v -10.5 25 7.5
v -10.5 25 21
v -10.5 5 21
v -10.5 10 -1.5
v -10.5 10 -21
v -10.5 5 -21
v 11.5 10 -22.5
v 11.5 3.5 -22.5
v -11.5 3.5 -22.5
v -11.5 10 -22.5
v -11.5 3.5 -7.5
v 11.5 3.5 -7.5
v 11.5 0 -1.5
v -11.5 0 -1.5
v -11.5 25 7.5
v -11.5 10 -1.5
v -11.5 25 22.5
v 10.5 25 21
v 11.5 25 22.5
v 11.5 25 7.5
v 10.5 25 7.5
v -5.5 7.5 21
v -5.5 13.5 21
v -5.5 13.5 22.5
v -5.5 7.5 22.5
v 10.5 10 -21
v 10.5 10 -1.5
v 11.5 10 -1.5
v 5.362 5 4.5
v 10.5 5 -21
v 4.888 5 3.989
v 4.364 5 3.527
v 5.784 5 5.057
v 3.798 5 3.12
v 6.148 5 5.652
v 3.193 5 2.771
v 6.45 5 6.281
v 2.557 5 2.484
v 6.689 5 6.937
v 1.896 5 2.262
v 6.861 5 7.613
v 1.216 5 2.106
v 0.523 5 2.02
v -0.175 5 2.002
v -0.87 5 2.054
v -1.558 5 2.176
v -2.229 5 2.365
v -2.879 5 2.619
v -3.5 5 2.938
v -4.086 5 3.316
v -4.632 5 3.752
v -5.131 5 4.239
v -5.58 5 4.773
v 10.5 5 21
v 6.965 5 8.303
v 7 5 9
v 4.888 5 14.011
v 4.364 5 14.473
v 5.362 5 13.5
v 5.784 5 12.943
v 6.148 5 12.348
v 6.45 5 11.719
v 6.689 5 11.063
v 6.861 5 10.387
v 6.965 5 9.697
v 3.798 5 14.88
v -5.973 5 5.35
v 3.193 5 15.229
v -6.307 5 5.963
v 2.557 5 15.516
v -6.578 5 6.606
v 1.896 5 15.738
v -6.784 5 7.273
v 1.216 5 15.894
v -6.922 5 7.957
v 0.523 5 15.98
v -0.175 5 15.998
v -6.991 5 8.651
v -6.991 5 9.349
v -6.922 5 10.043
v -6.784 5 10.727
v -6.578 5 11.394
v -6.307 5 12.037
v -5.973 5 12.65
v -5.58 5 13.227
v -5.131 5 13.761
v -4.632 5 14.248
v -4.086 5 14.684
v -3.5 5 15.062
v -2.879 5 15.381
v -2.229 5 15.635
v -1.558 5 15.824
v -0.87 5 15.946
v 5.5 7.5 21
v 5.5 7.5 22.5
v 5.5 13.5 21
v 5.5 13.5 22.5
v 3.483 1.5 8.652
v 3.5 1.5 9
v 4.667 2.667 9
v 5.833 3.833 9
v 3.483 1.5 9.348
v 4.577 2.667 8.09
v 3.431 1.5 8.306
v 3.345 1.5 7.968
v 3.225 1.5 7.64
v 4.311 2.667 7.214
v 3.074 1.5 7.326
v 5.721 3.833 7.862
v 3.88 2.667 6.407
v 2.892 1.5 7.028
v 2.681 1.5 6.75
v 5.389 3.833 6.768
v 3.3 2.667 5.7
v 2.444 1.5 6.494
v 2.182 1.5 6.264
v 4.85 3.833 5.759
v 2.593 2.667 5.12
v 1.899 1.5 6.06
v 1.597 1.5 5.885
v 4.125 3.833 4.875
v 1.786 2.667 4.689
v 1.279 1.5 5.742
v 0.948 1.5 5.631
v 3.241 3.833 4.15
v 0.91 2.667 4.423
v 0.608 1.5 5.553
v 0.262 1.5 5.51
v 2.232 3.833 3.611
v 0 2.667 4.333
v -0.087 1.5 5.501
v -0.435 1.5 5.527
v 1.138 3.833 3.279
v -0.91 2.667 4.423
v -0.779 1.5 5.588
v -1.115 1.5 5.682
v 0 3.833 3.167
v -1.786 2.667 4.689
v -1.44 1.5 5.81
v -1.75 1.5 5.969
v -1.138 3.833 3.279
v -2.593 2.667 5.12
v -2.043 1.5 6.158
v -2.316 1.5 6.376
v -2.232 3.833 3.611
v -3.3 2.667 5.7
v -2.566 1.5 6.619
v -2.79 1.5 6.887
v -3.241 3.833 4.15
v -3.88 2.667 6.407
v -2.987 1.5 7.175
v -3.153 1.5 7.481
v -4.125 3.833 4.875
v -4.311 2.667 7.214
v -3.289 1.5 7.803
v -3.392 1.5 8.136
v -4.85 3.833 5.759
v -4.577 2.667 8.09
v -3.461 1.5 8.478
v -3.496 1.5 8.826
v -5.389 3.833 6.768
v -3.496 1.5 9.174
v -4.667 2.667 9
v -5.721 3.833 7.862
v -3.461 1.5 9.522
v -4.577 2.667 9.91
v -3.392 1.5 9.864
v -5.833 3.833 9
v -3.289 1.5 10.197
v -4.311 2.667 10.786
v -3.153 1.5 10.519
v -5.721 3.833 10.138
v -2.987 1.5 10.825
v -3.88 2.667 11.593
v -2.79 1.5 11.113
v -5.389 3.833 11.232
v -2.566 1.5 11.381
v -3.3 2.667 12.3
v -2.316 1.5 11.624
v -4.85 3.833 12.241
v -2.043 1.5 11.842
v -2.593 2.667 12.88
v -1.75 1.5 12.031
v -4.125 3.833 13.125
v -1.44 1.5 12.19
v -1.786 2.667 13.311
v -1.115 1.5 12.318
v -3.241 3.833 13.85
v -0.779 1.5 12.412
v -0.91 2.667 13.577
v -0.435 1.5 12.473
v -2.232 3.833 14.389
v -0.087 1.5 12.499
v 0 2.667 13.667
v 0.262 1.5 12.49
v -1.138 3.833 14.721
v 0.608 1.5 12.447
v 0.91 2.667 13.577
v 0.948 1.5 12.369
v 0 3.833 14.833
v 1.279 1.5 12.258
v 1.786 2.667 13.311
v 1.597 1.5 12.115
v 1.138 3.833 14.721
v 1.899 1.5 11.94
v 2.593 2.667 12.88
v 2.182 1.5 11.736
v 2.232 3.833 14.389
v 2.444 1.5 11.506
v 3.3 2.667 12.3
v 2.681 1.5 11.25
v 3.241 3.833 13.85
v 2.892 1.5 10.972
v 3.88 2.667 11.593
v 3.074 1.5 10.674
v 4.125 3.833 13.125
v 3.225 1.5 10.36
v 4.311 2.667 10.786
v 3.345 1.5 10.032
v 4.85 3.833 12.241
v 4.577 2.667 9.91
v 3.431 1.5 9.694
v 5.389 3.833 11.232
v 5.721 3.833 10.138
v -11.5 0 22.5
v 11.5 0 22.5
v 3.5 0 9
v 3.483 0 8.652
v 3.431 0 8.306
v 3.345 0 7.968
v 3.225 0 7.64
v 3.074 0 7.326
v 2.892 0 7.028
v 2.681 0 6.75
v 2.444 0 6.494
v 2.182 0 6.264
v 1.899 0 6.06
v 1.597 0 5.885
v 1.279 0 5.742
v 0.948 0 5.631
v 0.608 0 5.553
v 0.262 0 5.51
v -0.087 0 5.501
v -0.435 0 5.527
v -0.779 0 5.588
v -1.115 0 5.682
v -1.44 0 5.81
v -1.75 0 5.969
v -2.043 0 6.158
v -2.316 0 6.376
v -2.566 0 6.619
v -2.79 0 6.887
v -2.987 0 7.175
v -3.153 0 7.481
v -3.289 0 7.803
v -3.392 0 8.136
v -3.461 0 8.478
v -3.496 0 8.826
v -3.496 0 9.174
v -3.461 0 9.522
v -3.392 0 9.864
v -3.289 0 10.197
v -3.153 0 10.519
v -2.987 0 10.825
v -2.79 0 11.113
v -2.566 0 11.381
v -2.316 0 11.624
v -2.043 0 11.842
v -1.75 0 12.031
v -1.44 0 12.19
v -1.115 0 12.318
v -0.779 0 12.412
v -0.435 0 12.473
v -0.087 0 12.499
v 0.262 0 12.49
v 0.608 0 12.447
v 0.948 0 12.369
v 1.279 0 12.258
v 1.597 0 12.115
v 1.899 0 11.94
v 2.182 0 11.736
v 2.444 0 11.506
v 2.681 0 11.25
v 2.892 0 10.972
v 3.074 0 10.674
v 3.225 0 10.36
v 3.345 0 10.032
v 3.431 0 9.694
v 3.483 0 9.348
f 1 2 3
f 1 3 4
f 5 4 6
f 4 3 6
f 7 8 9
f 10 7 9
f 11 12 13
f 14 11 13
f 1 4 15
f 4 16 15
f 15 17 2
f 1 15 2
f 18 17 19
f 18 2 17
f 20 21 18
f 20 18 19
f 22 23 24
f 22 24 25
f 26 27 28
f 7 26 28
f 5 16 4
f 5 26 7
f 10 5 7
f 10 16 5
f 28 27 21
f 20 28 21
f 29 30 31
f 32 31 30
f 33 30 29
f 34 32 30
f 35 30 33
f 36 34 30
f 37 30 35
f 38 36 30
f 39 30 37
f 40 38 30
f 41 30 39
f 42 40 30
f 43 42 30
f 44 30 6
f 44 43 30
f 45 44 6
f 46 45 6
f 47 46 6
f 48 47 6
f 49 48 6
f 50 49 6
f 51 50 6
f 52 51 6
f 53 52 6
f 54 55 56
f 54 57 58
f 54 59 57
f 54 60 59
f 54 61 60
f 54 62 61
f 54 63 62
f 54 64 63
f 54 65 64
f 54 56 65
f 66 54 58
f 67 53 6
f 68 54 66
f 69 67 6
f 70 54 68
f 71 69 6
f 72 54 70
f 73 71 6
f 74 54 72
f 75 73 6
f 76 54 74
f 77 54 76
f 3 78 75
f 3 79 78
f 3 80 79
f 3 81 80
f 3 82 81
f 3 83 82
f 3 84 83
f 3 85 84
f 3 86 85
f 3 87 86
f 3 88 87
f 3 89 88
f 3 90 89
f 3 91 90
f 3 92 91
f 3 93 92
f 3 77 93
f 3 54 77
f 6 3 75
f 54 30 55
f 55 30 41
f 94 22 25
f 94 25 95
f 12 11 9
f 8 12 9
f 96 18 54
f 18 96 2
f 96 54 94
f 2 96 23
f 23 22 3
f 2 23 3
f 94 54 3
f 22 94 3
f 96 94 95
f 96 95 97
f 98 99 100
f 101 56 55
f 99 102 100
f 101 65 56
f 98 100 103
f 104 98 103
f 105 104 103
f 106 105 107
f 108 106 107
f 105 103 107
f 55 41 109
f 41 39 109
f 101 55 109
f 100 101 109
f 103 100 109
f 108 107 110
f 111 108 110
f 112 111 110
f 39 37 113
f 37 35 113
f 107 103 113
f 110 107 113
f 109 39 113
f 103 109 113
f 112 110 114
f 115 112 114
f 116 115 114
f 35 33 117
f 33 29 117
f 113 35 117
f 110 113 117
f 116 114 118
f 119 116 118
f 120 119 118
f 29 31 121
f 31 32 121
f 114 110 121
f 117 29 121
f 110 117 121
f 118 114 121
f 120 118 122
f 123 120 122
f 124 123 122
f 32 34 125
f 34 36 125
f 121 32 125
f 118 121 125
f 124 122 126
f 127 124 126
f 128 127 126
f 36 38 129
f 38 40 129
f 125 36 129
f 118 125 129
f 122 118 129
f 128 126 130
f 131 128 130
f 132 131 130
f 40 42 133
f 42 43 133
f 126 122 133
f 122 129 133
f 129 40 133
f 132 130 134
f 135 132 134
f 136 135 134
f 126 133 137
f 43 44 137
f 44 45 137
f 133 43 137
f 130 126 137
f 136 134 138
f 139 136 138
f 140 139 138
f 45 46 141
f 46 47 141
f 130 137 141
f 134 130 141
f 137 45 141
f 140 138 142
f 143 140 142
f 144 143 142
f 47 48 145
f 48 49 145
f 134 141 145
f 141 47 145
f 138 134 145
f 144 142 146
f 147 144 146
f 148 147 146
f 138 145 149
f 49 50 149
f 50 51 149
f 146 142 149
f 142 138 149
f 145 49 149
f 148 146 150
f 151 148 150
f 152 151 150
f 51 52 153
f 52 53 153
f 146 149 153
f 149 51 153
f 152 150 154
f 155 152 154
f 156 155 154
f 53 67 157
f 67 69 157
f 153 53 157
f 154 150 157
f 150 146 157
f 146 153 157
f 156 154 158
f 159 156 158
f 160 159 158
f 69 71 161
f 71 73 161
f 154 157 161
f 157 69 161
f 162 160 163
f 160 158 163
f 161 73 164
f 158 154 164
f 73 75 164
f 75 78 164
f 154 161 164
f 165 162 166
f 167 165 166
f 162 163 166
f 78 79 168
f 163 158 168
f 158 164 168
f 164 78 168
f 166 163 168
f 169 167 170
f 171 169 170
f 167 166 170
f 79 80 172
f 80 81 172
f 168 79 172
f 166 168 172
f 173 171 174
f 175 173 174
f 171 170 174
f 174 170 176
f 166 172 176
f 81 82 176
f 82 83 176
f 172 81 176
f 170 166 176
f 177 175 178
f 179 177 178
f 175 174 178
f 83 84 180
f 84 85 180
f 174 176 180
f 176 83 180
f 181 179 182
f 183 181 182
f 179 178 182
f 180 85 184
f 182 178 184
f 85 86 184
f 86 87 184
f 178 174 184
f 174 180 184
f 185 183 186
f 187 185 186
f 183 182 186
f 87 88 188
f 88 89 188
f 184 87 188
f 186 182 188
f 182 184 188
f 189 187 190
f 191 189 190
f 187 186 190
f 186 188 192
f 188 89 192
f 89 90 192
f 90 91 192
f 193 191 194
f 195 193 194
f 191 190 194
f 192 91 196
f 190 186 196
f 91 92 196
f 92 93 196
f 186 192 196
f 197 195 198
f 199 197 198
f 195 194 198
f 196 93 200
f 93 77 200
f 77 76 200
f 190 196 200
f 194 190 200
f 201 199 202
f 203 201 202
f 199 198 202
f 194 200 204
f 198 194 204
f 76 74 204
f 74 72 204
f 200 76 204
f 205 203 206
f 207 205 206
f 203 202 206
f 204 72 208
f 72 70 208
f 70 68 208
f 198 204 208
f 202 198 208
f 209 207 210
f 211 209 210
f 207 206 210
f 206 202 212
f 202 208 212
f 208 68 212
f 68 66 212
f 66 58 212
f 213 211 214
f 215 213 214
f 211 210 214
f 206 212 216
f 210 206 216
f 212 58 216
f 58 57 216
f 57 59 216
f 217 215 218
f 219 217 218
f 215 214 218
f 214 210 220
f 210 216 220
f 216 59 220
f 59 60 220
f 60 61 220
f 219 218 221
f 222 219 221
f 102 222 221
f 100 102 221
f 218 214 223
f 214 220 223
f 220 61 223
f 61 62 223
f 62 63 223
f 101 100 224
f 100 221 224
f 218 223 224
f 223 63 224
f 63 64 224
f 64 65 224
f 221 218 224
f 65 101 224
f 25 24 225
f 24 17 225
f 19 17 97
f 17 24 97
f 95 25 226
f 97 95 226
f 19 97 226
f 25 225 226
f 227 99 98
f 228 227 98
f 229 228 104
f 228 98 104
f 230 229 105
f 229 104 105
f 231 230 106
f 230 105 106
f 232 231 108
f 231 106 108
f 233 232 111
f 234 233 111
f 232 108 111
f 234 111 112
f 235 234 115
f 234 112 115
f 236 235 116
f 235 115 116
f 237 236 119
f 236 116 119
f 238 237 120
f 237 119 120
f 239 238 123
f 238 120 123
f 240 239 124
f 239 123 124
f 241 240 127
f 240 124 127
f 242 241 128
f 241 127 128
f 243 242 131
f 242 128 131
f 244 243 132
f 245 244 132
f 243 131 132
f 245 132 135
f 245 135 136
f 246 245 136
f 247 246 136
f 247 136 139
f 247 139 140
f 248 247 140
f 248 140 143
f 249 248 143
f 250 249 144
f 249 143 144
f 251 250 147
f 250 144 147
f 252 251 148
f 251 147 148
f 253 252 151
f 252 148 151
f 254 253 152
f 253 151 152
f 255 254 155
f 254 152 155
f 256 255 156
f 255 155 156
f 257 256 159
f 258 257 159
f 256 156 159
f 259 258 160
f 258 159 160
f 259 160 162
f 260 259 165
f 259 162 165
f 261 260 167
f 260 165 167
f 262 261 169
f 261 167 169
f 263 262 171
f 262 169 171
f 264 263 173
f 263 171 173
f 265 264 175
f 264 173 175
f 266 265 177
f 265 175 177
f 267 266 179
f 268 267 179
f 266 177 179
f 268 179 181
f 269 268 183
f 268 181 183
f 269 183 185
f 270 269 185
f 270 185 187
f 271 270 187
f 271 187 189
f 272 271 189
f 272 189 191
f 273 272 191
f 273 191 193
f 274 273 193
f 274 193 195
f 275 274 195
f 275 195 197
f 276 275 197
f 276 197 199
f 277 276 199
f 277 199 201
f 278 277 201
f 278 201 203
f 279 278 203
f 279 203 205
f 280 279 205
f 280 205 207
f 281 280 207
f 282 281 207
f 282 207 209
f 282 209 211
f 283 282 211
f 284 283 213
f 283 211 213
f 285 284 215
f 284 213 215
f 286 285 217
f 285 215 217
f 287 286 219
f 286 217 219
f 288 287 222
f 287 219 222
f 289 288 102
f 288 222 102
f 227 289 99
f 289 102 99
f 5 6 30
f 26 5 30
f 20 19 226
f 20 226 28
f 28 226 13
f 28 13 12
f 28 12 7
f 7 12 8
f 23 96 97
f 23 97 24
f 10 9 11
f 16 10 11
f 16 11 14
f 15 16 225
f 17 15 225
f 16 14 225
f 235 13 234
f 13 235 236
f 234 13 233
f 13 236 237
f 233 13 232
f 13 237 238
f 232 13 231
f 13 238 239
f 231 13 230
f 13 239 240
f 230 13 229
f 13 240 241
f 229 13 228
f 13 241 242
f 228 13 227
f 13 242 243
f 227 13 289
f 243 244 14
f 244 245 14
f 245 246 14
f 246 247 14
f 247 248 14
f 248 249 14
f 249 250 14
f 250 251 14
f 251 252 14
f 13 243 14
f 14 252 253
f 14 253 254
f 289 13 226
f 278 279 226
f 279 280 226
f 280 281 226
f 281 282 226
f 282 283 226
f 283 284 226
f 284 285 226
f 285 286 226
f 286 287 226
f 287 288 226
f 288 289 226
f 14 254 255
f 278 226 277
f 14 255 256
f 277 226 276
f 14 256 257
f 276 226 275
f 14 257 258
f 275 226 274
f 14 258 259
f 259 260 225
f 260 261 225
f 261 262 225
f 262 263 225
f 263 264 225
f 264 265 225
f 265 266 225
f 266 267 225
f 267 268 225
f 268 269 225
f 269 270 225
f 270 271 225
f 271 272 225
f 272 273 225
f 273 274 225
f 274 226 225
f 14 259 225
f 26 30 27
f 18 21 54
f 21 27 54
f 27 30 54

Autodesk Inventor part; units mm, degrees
ref_plane "YZ Plane" through (0, 0, 0) normal (1, 0, 0) x (0, 1, 0)
ref_plane "XZ Plane" through (0, 0, 0) normal (0, 1, 0) x (-1, 0, 0)
ref_plane "XY Plane" through (0, 0, 0) normal (0, 0, 1) x (1, 0, 0)
sketch "Esquisse1" plane through (0, 0, 0) normal (0, 1, 0) x (-1, 0, 0)
  line L0 (-10.5, 21) -> (10.5, 21)
  line L1 (10.5, 21) -> (10.5, -21)
  line L2 (10.5, -21) -> (-10.5, -21)
  line L3 (-10.5, -21) -> (-10.5, 21)
  line L4 (10.5, -21) -> (11.5, -21)
  line L5 (11.5, -21) -> (11.5, 21)
  line L6 (11.5, 21) -> (10.5, 21)
  line L7 (10.5, 21) -> (10.5, -21)
  line L8 (-10.5, 21) -> (-11.5, 21)
  line L9 (-11.5, 21) -> (-11.5, -21)
  line L10 (-11.5, -21) -> (-10.5, -21)
  line L11 (-10.5, -21) -> (-10.5, 21)
  line L12 (11.5, 21) -> (-11.5, 21)
  line L13 (-11.5, 21) -> (-11.5, 22.5)
  line L14 (-11.5, 22.5) -> (11.5, 22.5)
  line L15 (11.5, 22.5) -> (11.5, 21)
  line L16 (11.5, -21) -> (-11.5, -21)
  line L17 (-11.5, -21) -> (-11.5, -22.5)
  line L18 (-11.5, -22.5) -> (11.5, -22.5)
  line L19 (11.5, -22.5) -> (11.5, -21)
  point P0 (0, 0)
  dimension "d0" = 21
  dimension "d1" = 42
  dimension "d2" = 21
  dimension "d3" = 10.5
  dimension "d4" = 1
  dimension "d5" = 1
  dimension "d6" = 1.5
  dimension "d7" = 1.5
extrude "Extrusion1" add sketch "Esquisse1" along normal blind 5
sketch "Esquisse2" plane through (0, 5, 0) normal (0, 1, 0) x (1, 0, 0)
  line L0 (11.5, -22.5) -> (11.5, 22.5) projected
  line L1 (11.5, 22.5) -> (-11.5, 22.5) projected
  line L2 (-11.5, 22.5) -> (-11.5, -22.5) projected
  line L3 (-11.5, -22.5) -> (11.5, -22.5) projected
  line L4 (-10.5, 21) -> (10.5, 21)
  line L5 (10.5, 21) -> (10.5, -21)
  line L6 (10.5, -21) -> (-10.5, -21)
  line L7 (-10.5, -21) -> (-10.5, 21)
  point P0 (0, 0)
  dimension "d10" = 1
  dimension "d11" = 1
  dimension "d12" = 1.5
  dimension "d13" = 1.5
extrude "Extrusion2" add sketch "Esquisse2" along normal blind 20
sketch "Esquisse3" plane through (0, 5, 0) normal (0, 1, 0) x (1, 0, 0)
  line L0 (10.5, -21) -> (10.5, 21) projected
  line L1 (-10.5, 21) -> (-10.5, -21) projected
  line L2 (10.5, -21) -> (0, -21)
  line L3 (0, -21) -> (0, -9) construction
  line L4 (0, -9) -> (10.5, -9) construction
  line L5 (10.5, -9) -> (10.5, -21)
  circle A0 centre (0, -9) radius 3.5
  point P0 (0, 0)
  dimension "d16" = 12
  dimension "d17" = 10.5
  dimension "d18" = 21
  dimension "d19" = 7
extrude "Extrusion3" cut sketch "Esquisse3" against normal through all
sketch "Esquisse4" plane through (-11.5, 0, -22.5) normal (-1, 0, 0) x (0, 0, 1)
  line L0 (45, 0) -> (45, 25) projected
  line L1 (0, 25) -> (21, 25)
  line L2 (21, 25) -> (21, 10) construction
  line L3 (21, 10) -> (0, 10)
  line L4 (0, 10) -> (0, 25)
  line L5 (45, 25) -> (30, 25)
  line L6 (30, 25) -> (30, 10) construction
  line L7 (30, 10) -> (45, 10) construction
  line L8 (45, 10) -> (45, 25)
  line L9 (21, 10) -> (30, 25)
  line L10 (30, 25) -> (21, 25)
  point P0 (22.5, 0)
  dimension "d22" = 15
  dimension "d23" = 24
  dimension "d24" = 15
extrude "Extrusion4" cut sketch "Esquisse4" against normal through all
sketch "Esquisse5" plane through (-11.5, 0, -22.5) normal (-1, 0, 0) x (0, 0, 1)
  line L0 (0, 0) -> (45, 0) projected
  line L1 (45, 0) -> (45, 25) projected
  line L2 (0, 0) -> (15, 0)
  line L3 (15, 0) -> (15, 3.5) construction
  line L4 (15, 3.5) -> (0, 3.5)
  line L5 (0, 3.5) -> (0, 0)
  line L6 (45, 0) -> (21, 0)
  line L7 (21, 0) -> (21, 3.5) construction
  line L8 (21, 3.5) -> (45, 3.5) construction
  line L9 (45, 3.5) -> (45, 0)
  line L10 (15, 3.5) -> (21, 0)
  line L11 (15, 0) -> (21, 0)
  point P0 (22.5, 0)
  dimension "d27" = 3.5
  dimension "d28" = 30
  dimension "d29" = 24
extrude "Extrusion5" cut sketch "Esquisse5" against normal through all
chamfer "Chanfrein1" distance 3.5 angle 45 1 edges at (-3.5, 5, 9)
sketch "Esquisse8" plane through (10.5, 5, 21) normal (0, 0, -1) x (-1, 0, 0)
  line L0 (21, 0) -> (0, 0) projected
  line L1 (21, 0) -> (21, 20) projected
  line L2 (0, 0) -> (0, 20) projected
  line L3 (5, 8.5) -> (16, 8.5)
  line L4 (16, 8.5) -> (16, 2.5)
  line L5 (16, 2.5) -> (5, 2.5)
  line L6 (5, 2.5) -> (5, 8.5)
  point P0 (10.5, -5)
  dimension "d38" = 2.5
  dimension "d39" = 6
  dimension "d40" = 11
  dimension "d41" = 21
  dimension "d42" = 5
extrude "Extrusion6" cut sketch "Esquisse8" against normal through all
equation "\"d2\" = 0.5 * d1"
equation "\"d3\" = 0.5 * d0"
equation "\"d5\" = d4"
equation "\"d7\" = d6"
equation "\"d11\" = d10"
equation "\"d13\" = d12"
equation "\"d17\" = 0.5 * d18"
equation "\"d42\" = -0.5 * d40 + 0.5 * d41"
properties part number "anti_axe_2"
